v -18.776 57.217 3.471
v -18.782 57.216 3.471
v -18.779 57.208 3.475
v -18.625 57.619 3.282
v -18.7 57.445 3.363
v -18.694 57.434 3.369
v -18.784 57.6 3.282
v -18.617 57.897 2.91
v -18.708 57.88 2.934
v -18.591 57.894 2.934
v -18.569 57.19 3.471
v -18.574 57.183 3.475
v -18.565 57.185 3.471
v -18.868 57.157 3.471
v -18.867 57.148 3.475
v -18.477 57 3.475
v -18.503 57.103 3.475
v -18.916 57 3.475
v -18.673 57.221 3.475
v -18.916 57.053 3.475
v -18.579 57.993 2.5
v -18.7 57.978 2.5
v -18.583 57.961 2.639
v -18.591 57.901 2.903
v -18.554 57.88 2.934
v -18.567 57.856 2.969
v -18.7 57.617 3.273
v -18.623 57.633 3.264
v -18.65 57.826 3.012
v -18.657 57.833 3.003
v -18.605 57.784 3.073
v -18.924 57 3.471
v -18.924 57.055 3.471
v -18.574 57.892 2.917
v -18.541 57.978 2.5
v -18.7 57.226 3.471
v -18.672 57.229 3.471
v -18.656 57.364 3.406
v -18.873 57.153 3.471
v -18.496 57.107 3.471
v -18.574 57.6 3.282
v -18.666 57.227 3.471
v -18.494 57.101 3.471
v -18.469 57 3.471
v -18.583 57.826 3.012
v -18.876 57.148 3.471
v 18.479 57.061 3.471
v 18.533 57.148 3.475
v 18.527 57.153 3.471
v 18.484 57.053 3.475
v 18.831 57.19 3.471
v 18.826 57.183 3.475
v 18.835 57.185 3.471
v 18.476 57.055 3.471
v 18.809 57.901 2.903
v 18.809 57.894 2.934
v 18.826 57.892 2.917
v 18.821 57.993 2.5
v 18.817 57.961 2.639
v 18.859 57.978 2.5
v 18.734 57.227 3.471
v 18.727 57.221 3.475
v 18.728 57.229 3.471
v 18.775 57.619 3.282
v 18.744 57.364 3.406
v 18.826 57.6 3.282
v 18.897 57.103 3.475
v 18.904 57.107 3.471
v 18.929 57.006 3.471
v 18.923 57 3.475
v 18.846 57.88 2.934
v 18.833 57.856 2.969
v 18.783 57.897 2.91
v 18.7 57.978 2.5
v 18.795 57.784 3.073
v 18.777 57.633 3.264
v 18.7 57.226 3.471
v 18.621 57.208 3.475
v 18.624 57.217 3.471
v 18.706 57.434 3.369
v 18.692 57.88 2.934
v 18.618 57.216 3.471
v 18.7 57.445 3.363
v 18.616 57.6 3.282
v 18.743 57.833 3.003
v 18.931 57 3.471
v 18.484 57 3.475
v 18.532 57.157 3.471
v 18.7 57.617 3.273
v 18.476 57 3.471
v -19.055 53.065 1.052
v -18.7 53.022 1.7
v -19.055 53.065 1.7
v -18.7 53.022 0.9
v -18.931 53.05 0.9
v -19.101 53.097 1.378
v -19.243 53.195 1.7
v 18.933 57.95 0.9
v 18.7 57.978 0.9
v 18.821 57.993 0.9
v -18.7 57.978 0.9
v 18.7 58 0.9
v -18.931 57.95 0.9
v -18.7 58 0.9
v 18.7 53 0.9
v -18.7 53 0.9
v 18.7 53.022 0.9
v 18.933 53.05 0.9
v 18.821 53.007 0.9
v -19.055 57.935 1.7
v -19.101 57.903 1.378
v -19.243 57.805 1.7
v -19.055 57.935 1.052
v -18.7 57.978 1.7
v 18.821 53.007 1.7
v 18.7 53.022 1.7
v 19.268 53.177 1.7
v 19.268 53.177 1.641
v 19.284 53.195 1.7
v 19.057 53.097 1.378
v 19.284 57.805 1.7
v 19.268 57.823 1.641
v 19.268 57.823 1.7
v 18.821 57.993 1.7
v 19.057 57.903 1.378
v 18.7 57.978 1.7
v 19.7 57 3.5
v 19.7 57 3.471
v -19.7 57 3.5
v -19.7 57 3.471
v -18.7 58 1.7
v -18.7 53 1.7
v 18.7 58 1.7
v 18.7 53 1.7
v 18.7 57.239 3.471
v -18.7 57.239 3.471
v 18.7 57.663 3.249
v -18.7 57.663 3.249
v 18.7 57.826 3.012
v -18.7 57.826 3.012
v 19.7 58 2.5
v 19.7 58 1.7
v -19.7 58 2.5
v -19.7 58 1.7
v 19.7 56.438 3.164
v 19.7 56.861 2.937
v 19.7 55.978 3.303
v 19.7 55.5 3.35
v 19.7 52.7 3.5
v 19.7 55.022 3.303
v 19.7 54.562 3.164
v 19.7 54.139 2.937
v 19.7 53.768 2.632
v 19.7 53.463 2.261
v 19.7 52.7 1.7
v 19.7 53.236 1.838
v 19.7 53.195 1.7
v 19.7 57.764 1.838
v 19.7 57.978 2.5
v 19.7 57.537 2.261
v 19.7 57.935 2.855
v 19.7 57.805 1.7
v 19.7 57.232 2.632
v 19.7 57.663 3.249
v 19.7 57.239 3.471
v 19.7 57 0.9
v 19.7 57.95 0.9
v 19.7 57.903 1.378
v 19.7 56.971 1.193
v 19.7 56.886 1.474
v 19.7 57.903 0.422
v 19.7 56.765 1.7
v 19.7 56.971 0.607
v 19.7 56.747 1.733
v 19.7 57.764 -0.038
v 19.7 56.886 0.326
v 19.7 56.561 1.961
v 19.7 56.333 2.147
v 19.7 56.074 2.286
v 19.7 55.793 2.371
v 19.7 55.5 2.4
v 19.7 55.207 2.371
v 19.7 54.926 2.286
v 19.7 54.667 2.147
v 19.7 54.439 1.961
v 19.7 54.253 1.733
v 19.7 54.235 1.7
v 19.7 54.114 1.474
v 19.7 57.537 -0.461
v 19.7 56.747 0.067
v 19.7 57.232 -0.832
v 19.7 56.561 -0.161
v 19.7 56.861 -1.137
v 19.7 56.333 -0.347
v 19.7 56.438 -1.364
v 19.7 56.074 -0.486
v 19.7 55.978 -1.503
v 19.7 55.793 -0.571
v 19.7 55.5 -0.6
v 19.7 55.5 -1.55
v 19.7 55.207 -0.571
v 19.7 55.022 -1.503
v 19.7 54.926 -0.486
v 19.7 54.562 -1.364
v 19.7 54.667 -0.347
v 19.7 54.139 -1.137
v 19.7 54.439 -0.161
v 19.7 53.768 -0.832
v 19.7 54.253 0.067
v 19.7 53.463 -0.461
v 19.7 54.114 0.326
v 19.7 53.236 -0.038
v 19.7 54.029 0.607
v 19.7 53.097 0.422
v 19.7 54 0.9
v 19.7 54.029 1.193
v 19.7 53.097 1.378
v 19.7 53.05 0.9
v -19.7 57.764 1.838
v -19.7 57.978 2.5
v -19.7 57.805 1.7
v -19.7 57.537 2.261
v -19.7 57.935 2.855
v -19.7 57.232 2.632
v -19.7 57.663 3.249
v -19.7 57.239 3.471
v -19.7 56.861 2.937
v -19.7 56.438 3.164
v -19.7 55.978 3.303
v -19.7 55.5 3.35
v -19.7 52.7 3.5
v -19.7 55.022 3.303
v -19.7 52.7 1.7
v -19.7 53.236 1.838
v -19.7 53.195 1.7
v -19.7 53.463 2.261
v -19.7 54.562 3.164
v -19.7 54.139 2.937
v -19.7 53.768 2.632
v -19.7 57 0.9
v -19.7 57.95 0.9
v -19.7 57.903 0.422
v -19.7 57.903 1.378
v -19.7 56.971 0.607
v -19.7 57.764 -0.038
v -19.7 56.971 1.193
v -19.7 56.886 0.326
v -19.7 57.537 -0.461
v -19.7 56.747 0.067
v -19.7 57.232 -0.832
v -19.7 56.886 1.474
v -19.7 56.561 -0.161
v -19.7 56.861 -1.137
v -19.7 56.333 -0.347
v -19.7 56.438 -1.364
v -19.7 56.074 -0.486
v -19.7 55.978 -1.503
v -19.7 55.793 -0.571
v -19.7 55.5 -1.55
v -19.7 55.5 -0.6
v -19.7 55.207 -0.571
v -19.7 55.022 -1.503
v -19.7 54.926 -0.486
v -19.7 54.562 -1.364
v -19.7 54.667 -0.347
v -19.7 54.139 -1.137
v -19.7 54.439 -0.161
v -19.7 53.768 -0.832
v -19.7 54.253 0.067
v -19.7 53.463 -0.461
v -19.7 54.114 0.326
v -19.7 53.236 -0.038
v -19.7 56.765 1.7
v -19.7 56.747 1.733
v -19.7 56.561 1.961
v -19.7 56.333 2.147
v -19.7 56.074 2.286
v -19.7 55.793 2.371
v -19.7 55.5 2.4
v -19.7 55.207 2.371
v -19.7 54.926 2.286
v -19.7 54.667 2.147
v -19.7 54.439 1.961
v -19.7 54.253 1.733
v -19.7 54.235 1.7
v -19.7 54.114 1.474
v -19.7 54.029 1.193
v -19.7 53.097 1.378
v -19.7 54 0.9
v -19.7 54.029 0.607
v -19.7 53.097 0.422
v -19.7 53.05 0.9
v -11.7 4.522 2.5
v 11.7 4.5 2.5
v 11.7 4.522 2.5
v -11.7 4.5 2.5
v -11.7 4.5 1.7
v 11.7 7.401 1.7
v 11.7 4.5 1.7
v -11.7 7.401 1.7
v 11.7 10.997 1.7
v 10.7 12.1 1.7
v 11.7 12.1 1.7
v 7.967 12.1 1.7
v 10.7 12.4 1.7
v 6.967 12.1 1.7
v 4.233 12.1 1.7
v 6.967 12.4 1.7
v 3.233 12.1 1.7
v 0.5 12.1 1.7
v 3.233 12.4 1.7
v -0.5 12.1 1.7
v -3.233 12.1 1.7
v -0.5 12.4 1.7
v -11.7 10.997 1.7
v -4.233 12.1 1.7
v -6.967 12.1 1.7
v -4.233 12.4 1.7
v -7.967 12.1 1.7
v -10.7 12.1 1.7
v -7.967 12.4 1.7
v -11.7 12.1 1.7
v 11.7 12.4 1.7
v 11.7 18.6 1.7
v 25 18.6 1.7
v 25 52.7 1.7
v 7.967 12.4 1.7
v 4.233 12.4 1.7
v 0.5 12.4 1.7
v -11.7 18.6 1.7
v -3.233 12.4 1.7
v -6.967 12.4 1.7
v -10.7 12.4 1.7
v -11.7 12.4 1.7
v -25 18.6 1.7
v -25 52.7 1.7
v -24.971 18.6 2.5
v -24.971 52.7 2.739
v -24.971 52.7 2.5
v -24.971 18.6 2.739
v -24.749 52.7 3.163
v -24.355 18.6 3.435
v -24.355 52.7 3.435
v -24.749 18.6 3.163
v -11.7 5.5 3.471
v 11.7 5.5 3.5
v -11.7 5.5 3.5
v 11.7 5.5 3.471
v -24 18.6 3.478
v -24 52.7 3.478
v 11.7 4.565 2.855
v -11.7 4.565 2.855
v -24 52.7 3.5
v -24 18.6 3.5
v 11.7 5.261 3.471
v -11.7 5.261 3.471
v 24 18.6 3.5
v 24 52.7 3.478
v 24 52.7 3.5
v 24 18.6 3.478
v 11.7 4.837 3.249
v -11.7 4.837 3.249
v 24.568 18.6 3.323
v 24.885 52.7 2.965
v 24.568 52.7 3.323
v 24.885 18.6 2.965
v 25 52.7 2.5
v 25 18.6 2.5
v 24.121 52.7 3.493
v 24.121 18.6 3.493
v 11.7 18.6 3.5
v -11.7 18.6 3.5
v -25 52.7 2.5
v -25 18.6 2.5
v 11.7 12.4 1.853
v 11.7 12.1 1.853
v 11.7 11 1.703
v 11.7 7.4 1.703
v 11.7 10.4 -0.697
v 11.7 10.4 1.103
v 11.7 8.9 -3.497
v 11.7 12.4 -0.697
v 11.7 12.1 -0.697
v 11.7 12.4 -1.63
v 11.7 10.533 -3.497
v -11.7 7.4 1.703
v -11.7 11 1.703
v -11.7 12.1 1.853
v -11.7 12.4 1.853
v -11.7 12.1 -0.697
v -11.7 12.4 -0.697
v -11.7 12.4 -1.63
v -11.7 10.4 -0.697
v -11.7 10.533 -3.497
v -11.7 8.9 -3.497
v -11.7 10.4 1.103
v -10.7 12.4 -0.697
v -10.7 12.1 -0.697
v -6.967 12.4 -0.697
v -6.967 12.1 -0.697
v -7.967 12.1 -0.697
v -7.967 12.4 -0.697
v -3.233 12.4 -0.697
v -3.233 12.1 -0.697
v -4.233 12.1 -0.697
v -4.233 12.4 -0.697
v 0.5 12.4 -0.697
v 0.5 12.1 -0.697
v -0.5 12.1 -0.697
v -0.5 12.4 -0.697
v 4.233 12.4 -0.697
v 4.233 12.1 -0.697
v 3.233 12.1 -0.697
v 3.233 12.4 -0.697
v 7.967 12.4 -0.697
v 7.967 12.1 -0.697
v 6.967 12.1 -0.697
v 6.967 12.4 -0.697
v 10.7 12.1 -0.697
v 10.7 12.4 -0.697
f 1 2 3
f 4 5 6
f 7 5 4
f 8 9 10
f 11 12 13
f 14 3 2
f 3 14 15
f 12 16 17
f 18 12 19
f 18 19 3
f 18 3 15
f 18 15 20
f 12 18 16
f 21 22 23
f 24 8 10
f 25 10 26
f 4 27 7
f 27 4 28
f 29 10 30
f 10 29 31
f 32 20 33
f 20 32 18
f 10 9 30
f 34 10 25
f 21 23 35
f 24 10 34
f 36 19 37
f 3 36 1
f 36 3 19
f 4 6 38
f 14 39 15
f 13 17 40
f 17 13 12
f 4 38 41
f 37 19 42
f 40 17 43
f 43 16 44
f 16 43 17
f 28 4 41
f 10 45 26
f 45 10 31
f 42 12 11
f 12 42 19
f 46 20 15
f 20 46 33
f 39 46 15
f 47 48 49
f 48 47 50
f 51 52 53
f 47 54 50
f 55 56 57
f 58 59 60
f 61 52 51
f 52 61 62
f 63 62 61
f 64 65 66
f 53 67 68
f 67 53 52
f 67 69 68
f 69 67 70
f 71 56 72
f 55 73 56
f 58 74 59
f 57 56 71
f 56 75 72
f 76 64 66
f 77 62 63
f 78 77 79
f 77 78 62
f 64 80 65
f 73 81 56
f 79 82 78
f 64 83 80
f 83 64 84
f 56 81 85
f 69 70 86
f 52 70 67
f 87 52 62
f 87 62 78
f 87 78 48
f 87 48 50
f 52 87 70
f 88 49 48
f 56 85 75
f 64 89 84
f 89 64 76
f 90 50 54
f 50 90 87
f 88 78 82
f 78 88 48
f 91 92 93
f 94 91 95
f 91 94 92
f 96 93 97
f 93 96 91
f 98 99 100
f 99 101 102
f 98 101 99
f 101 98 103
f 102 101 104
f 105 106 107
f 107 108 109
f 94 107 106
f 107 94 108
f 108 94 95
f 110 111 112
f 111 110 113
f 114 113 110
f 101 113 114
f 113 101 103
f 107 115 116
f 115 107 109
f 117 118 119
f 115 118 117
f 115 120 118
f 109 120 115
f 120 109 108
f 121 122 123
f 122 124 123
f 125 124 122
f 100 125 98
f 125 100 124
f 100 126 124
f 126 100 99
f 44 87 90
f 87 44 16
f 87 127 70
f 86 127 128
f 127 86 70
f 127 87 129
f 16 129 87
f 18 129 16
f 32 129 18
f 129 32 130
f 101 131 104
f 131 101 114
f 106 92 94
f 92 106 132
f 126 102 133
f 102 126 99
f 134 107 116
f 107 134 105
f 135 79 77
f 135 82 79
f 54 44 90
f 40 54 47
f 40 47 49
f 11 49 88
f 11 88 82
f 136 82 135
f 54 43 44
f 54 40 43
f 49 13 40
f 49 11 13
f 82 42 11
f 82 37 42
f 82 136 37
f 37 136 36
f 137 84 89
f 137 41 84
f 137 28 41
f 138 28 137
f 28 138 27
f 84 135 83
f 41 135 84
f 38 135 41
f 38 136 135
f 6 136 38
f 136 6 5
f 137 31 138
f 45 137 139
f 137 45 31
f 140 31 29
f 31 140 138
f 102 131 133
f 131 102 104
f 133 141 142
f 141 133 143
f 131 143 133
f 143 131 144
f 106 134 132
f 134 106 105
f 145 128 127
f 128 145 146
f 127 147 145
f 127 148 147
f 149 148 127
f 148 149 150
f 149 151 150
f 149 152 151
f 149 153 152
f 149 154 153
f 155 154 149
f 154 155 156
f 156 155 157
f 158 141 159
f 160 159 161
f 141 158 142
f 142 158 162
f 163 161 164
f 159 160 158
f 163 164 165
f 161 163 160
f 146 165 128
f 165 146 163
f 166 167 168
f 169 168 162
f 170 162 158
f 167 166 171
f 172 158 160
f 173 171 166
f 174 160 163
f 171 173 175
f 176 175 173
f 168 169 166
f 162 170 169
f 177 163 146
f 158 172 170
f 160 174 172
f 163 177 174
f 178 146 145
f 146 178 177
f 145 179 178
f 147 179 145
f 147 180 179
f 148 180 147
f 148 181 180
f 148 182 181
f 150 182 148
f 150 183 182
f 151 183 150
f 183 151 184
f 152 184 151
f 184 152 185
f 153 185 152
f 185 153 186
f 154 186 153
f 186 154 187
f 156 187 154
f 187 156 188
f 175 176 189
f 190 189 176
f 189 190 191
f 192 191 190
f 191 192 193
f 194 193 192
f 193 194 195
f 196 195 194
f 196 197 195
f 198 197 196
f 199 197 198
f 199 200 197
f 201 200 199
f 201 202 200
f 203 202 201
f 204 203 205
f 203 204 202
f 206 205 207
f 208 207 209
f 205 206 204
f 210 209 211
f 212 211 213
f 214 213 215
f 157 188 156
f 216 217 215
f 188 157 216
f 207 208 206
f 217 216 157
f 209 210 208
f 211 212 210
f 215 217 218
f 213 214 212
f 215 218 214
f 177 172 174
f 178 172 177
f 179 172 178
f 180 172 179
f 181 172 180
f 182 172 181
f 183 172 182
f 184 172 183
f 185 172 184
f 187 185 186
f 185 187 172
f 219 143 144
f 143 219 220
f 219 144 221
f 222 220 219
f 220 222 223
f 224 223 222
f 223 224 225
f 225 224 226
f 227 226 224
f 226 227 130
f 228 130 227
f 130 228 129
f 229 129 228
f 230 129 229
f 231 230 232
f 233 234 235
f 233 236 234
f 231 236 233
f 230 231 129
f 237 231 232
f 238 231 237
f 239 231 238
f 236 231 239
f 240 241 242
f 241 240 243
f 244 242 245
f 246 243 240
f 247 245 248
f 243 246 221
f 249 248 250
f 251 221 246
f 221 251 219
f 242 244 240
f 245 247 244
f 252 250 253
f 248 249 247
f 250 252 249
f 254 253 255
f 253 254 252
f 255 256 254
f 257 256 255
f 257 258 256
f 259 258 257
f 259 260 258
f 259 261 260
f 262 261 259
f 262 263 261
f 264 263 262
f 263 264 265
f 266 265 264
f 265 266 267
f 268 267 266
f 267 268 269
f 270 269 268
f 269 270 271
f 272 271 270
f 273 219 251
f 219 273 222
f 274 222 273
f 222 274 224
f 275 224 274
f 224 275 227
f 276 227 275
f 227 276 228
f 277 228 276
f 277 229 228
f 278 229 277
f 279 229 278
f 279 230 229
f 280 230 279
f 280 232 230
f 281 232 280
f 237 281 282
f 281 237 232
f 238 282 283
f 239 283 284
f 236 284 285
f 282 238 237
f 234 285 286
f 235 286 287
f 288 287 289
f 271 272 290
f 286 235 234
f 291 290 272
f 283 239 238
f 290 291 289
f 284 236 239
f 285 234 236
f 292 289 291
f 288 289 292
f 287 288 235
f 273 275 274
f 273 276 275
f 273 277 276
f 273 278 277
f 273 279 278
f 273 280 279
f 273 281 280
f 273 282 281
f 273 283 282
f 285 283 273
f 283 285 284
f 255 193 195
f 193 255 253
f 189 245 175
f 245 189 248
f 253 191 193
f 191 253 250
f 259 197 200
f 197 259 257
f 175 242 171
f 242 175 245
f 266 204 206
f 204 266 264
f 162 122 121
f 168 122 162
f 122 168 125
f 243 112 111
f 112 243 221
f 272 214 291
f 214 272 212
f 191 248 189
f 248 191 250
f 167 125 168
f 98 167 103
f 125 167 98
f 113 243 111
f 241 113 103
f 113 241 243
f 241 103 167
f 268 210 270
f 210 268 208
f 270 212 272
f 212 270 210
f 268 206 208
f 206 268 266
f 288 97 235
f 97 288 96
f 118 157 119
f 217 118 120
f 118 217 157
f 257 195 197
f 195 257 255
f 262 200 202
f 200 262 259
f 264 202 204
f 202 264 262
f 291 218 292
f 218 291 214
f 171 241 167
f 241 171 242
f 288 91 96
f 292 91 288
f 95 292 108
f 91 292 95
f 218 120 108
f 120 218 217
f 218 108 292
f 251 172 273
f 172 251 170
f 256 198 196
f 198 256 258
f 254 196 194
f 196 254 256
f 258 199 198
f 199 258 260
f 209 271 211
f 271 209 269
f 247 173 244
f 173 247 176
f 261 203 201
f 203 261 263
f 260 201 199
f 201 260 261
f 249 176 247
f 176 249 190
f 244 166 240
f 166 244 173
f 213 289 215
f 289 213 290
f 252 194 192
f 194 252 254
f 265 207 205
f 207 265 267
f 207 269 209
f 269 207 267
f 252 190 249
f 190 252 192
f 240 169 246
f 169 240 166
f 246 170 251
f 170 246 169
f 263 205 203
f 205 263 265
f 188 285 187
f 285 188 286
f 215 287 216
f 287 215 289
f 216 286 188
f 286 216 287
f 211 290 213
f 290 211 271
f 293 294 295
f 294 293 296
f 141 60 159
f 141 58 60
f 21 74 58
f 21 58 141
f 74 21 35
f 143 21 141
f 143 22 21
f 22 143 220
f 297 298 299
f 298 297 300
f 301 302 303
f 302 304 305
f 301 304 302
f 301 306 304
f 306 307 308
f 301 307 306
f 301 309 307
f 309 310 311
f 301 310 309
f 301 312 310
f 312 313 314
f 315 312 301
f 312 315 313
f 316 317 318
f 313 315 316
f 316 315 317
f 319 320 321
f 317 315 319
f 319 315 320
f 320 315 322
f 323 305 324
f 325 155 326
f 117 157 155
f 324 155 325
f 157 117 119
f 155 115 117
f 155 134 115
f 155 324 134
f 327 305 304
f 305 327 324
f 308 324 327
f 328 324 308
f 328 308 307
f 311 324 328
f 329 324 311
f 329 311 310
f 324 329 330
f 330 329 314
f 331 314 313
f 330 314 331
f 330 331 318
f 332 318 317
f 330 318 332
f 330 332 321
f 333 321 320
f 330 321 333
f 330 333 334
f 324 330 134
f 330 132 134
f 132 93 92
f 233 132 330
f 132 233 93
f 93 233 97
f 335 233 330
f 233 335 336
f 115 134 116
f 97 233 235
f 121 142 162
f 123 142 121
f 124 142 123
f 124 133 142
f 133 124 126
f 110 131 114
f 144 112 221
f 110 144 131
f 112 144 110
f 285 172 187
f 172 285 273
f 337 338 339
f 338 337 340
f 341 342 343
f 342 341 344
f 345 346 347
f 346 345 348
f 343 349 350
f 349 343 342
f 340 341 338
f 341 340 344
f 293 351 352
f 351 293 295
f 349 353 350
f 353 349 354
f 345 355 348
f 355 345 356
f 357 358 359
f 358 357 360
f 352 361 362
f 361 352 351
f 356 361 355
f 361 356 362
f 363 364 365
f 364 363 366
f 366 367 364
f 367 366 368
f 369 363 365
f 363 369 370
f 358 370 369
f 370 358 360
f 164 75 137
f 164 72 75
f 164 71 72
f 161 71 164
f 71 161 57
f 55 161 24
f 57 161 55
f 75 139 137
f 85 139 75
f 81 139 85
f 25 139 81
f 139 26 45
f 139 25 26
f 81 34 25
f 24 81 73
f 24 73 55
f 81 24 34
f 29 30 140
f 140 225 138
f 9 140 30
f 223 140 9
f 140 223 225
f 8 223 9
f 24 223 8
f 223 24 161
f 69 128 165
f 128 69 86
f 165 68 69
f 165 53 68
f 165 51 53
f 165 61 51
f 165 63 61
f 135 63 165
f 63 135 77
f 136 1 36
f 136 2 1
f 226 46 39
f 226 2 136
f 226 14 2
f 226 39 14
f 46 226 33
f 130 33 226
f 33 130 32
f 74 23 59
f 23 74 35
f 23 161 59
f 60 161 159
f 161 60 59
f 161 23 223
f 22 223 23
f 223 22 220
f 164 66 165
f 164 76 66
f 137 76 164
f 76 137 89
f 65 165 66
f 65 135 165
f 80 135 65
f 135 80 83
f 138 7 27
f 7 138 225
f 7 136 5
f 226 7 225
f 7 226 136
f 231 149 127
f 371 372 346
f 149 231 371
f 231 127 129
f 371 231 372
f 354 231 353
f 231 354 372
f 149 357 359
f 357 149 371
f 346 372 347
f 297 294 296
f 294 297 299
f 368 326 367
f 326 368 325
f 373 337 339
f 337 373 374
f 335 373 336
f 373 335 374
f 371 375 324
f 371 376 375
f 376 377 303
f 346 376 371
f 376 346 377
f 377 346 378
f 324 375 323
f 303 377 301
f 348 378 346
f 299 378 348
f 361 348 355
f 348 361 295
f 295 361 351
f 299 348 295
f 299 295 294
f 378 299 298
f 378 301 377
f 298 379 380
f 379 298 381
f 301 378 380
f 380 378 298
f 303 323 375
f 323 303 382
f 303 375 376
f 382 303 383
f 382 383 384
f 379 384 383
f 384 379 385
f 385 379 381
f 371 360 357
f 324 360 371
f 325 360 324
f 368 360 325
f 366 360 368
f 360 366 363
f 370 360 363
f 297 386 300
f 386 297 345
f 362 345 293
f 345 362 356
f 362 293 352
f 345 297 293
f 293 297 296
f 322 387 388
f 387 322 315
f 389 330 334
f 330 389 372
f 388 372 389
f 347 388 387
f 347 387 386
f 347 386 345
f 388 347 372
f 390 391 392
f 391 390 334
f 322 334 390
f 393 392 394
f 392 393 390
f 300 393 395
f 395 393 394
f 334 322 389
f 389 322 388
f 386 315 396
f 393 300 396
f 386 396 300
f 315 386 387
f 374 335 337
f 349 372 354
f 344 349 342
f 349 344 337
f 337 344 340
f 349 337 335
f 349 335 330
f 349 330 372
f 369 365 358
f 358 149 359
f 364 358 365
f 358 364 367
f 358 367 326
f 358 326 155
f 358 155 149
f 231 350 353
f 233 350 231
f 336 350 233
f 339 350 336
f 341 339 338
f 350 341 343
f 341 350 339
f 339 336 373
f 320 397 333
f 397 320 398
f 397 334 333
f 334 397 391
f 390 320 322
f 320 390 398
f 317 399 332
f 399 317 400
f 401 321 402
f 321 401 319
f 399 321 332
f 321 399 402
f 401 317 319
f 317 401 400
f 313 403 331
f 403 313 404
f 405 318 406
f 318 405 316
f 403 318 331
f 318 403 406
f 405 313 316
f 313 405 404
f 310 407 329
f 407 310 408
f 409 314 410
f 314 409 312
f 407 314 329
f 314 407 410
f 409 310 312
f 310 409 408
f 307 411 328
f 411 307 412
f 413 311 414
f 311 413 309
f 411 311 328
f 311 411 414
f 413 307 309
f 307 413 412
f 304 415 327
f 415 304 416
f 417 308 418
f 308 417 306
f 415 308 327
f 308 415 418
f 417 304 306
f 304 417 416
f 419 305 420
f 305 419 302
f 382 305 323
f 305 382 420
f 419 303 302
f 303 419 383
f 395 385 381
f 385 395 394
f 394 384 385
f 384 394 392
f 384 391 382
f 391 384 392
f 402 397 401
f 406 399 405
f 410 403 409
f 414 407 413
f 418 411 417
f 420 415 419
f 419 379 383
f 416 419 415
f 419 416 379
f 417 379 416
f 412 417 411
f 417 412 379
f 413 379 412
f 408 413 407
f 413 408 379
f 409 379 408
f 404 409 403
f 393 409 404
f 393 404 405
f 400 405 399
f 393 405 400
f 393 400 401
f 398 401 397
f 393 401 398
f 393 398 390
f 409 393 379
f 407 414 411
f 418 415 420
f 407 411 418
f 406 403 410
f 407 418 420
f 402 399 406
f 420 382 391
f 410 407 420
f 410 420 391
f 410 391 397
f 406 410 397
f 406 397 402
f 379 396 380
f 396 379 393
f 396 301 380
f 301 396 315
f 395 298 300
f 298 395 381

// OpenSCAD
// file: hook.scad
module hook(
    hook_w = 50,
	hook_h = 6,
	gap = 0.3,
	ground_len = 10,
	hook_inner_deep = 2,
	hook_inner_h = 3,
	wall = 1.6
){

	outer_h = hook_h - hook_inner_h;
	support_w = 0.3;
	support_l = 1;

    union(){
        rotate(90,[0,1,0]){
            linear_extrude(hook_w, center=true){
                polygon([
                    [0,0],
                    [0,ground_len+wall/2-gap],
                    
                    [wall/2-gap,ground_len],
                    
                    [hook_inner_h,ground_len],
                    
                    [hook_inner_h,ground_len+hook_inner_deep],
                    
                    [hook_inner_h+outer_h/3, ground_len+hook_inner_deep],
                    
                    [hook_h,ground_len+hook_inner_deep-2*outer_h/3],
                    
                    [hook_h,ground_len/2],
                ]);
            }
        }
        translate([0,ground_len+hook_inner_deep-support_w/2,-(hook_inner_h+gap)/2+gap/2]){
			union(){
				
				for(i=[-3:3]){
					translate([i/3*(hook_w/2-support_l/2),0,0]){
						cube([support_l,support_w,hook_inner_h+gap],center=true);
					}
				}
			}            
        }
    }
    

}

hook();
// file: round_cube.scad
module round_cube(sizes, radius){
    
    union(){
        for(xd = [-1,1]){
        for(yd = [-1,1]){
        for(zd = [-1,1]){
            translate([
                (sizes[0]/2 - radius)*xd,
                (sizes[1]/2 - radius)*yd,
                (sizes[2]/2 - radius)*zd]
            ){
                sphere(radius, $fs=0.25);
            }
        }}}
        cube([sizes[0]-radius*2,sizes[1]-radius*2,sizes[2]], center=true);
        cube([sizes[0]-radius*2,sizes[1],sizes[2]-radius*2], center=true);
        cube([sizes[0],sizes[1]-radius*2,sizes[2]-radius*2], center=true);
    
        for(d1 = [-1,1]){
        for(d2 = [-1,1]){        
            translate([
                (sizes[0]/2-radius)*d1,
                (sizes[1]/2-radius)*d2,
                0
            ]){
                cylinder(h=sizes[2]-radius*2, r=radius, center=true, $fs=0.25);
            }        
            translate([
                0,
                (sizes[1]/2-radius)*d1,
                (sizes[2]/2-radius)*d2            
            ]){
                rotate(a=[0,90,0]){
                    cylinder(h=sizes[0]-radius*2, r=radius, center=true, $fs=0.25);
                }    
            }        
            translate([
                (sizes[0]/2-radius)*d1,
                0,
                (sizes[2]/2-radius)*d2            
            ]){
                rotate(a=[90,0,0]){
                    cylinder(h=sizes[1]-radius*2, r=radius, center=true, $fs=0.25);
                }    
            }        
        }}
    }
}


module upround_cube(sizes, radius){
    
	intersection(){
	    union(){
	        for(xd = [-1,1]){
	        for(yd = [-1,1]){
	            translate([
	                (sizes[0]/2 - radius)*xd,
	                (sizes[1]/2 - radius)*yd,
	                (sizes[2]/2 - radius)*1]
	            ){
	                sphere(radius, $fs=0.5);
	            }
	        }}
        
	        cube([sizes[0]-radius*2,sizes[1]-radius*2,sizes[2]], center=true);
        
	        translate([0,0,-radius/2]){
	            cube([sizes[0]-radius*2,sizes[1],sizes[2]-radius], center=true);
	        }
	        translate([0,0,-radius/2]){
	            cube([sizes[0],sizes[1]-radius*2,sizes[2]-radius], center=true);
	        }
    
	        for(d1 = [-1,1]){
	        for(d2 = [-1,1]){        
	            translate([
	                (sizes[0]/2-radius)*d1,
	                (sizes[1]/2-radius)*d2,
	                -radius/2
	            ]){
	                cylinder(h=sizes[2]-radius, r=radius, center=true, $fs=0.5);
	            }        
	        }}

	        for(d1 = [-1,1]){
	            translate([
	                (sizes[0]/2-radius)*d1,
	                0,
	                (sizes[2]/2-radius)*1            
	            ]){
	                rotate(a=[90,0,0]){
	                    cylinder(h=sizes[1]-radius*2, r=radius, center=true, $fs=0.5);
	                }    
	            }
	            translate([
	                0,
	                (sizes[1]/2-radius)*d1,
	                (sizes[2]/2-radius)*1            
	            ]){
	                rotate(a=[0,90,0]){
	                    cylinder(h=sizes[0]-radius*2, r=radius, center=true, $fs=0.5);
	                }    
	            }        
                    
	        }
	    }
		cube(sizes,center=true);
	}
	
    
}

round_cube([30,50,7], radius = 1);

translate([40,0,0]){
    upround_cube([30,50,30], radius = 5);
}
// main file
use <round_cube.scad>
use <hook.scad>

module panel(
    width = 50,
	deep = 36,
	height = 7,
	belt = 35,
	gap = 0.3,
	wall = 1.8,
	hinge_hole = 3,
	hinge_deep = 5,
	latch_v_slip = 4,
	uphole_width = 24,
	uphole_deep = 12
){

    hinge_small_w = hinge_deep;
	hinge_width = width;
	panel_deep = belt+hinge_deep+wall+uphole_deep-gap;
	render(){
	
	    union(){
			translate([0,deep/2+belt+hinge_deep/2,wall/2]){
				difference(){
					union(){
						translate([0,0,(height-wall)/4]){
						    upround_cube([hinge_width-hinge_deep*2-gap*2, hinge_deep, (height-wall)/2],1);
					    }
					    rotate(90, [0,1,0]){
							cylinder(hinge_width-hinge_deep*2-gap*2, d=height-wall-gap,center=true, $fn=32);
					    }
					}
				    rotate(90, [0,1,0]){
				        cylinder(hinge_width+gap, d=hinge_hole,center=true, $fn=32);
				    }
				}
			}    
			translate([0,-panel_deep/2+deep/2+belt+hinge_deep,height/2-wall/2]){
				difference(){
					//panel
				    upround_cube([hinge_width, panel_deep,wall],1);
					//panel holes
					translate([
						hinge_width+uphole_width/2-gap,
						-panel_deep/2-uphole_deep+wall+uphole_deep+gap,
						0
					]){
					    cube([hinge_width*2,uphole_deep*2,height*2],center=true);
				    }
				
					translate([
						-1*(hinge_width+uphole_width/2-gap),
						-panel_deep/2-uphole_deep+wall+uphole_deep+gap,
						0
					]){
					    cube([hinge_width*2,uphole_deep*2,height*2],center=true);
				    }
				
					translate([
						hinge_width+hinge_width/2-hinge_small_w-gap,
						panel_deep/2+uphole_deep-hinge_deep-gap,
						0
					]){
					    cube([hinge_width*2,uphole_deep*2,height*2],center=true);
				    }
				
					translate([
						-1*(hinge_width+hinge_width/2-hinge_small_w-gap),
						panel_deep/2+uphole_deep-hinge_deep-gap,
						0
					]){
					    cube([hinge_width*2,uphole_deep*2,height*2],center=true);
				    }
				}
			}
			
			ground_len = 3;
			translate([0,deep/2-latch_v_slip-wall-ground_len-wall,height/2-wall+gap/100]){
				hook(
				    hook_w = uphole_width-gap*2,
					hook_h = height-wall,
					gap = gap,
					ground_len = ground_len,
					hook_inner_deep = 2,
					hook_inner_h = wall+2*gap,
					wall = wall
				);
			}
			
		}
	}

}

panel();
